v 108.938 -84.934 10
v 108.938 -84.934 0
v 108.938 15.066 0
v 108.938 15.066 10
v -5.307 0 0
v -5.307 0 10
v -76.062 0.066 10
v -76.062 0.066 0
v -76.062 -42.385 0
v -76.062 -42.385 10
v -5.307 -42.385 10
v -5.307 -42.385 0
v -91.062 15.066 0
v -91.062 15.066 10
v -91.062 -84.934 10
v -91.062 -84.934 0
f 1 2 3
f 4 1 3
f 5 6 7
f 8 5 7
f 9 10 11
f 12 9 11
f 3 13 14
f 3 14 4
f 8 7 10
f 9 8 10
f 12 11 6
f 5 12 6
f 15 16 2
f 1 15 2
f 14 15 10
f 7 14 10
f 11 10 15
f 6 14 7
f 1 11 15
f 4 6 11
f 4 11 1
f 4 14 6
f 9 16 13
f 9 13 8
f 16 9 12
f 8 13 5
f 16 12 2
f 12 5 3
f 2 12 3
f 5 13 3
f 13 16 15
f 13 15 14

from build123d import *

# Parameters (mm, degrees)
F0_W     = 200
F0_H     = 100
F1_DEPTH = 10
F3_DEPTH = 25


with BuildPart() as f1:
    # F0 (on Top) → F1 (new body)
    with BuildSketch(Plane.XY):
        with Locations((8.938173, -34.933871)):
            Rectangle(F0_W, F0_H)
    extrude(amount=F1_DEPTH)

    # F2 (on face) → F3 (cut)
    with BuildSketch(Plane.XY.offset(10)):
        Polygon((-5.306835, -42.385153), (-5.306835, 0), (-76.061827, 0.066129), (-76.061827, -42.385153), align=None)
    extrude(amount=-F3_DEPTH, mode=Mode.SUBTRACT)


solid = f1.part
